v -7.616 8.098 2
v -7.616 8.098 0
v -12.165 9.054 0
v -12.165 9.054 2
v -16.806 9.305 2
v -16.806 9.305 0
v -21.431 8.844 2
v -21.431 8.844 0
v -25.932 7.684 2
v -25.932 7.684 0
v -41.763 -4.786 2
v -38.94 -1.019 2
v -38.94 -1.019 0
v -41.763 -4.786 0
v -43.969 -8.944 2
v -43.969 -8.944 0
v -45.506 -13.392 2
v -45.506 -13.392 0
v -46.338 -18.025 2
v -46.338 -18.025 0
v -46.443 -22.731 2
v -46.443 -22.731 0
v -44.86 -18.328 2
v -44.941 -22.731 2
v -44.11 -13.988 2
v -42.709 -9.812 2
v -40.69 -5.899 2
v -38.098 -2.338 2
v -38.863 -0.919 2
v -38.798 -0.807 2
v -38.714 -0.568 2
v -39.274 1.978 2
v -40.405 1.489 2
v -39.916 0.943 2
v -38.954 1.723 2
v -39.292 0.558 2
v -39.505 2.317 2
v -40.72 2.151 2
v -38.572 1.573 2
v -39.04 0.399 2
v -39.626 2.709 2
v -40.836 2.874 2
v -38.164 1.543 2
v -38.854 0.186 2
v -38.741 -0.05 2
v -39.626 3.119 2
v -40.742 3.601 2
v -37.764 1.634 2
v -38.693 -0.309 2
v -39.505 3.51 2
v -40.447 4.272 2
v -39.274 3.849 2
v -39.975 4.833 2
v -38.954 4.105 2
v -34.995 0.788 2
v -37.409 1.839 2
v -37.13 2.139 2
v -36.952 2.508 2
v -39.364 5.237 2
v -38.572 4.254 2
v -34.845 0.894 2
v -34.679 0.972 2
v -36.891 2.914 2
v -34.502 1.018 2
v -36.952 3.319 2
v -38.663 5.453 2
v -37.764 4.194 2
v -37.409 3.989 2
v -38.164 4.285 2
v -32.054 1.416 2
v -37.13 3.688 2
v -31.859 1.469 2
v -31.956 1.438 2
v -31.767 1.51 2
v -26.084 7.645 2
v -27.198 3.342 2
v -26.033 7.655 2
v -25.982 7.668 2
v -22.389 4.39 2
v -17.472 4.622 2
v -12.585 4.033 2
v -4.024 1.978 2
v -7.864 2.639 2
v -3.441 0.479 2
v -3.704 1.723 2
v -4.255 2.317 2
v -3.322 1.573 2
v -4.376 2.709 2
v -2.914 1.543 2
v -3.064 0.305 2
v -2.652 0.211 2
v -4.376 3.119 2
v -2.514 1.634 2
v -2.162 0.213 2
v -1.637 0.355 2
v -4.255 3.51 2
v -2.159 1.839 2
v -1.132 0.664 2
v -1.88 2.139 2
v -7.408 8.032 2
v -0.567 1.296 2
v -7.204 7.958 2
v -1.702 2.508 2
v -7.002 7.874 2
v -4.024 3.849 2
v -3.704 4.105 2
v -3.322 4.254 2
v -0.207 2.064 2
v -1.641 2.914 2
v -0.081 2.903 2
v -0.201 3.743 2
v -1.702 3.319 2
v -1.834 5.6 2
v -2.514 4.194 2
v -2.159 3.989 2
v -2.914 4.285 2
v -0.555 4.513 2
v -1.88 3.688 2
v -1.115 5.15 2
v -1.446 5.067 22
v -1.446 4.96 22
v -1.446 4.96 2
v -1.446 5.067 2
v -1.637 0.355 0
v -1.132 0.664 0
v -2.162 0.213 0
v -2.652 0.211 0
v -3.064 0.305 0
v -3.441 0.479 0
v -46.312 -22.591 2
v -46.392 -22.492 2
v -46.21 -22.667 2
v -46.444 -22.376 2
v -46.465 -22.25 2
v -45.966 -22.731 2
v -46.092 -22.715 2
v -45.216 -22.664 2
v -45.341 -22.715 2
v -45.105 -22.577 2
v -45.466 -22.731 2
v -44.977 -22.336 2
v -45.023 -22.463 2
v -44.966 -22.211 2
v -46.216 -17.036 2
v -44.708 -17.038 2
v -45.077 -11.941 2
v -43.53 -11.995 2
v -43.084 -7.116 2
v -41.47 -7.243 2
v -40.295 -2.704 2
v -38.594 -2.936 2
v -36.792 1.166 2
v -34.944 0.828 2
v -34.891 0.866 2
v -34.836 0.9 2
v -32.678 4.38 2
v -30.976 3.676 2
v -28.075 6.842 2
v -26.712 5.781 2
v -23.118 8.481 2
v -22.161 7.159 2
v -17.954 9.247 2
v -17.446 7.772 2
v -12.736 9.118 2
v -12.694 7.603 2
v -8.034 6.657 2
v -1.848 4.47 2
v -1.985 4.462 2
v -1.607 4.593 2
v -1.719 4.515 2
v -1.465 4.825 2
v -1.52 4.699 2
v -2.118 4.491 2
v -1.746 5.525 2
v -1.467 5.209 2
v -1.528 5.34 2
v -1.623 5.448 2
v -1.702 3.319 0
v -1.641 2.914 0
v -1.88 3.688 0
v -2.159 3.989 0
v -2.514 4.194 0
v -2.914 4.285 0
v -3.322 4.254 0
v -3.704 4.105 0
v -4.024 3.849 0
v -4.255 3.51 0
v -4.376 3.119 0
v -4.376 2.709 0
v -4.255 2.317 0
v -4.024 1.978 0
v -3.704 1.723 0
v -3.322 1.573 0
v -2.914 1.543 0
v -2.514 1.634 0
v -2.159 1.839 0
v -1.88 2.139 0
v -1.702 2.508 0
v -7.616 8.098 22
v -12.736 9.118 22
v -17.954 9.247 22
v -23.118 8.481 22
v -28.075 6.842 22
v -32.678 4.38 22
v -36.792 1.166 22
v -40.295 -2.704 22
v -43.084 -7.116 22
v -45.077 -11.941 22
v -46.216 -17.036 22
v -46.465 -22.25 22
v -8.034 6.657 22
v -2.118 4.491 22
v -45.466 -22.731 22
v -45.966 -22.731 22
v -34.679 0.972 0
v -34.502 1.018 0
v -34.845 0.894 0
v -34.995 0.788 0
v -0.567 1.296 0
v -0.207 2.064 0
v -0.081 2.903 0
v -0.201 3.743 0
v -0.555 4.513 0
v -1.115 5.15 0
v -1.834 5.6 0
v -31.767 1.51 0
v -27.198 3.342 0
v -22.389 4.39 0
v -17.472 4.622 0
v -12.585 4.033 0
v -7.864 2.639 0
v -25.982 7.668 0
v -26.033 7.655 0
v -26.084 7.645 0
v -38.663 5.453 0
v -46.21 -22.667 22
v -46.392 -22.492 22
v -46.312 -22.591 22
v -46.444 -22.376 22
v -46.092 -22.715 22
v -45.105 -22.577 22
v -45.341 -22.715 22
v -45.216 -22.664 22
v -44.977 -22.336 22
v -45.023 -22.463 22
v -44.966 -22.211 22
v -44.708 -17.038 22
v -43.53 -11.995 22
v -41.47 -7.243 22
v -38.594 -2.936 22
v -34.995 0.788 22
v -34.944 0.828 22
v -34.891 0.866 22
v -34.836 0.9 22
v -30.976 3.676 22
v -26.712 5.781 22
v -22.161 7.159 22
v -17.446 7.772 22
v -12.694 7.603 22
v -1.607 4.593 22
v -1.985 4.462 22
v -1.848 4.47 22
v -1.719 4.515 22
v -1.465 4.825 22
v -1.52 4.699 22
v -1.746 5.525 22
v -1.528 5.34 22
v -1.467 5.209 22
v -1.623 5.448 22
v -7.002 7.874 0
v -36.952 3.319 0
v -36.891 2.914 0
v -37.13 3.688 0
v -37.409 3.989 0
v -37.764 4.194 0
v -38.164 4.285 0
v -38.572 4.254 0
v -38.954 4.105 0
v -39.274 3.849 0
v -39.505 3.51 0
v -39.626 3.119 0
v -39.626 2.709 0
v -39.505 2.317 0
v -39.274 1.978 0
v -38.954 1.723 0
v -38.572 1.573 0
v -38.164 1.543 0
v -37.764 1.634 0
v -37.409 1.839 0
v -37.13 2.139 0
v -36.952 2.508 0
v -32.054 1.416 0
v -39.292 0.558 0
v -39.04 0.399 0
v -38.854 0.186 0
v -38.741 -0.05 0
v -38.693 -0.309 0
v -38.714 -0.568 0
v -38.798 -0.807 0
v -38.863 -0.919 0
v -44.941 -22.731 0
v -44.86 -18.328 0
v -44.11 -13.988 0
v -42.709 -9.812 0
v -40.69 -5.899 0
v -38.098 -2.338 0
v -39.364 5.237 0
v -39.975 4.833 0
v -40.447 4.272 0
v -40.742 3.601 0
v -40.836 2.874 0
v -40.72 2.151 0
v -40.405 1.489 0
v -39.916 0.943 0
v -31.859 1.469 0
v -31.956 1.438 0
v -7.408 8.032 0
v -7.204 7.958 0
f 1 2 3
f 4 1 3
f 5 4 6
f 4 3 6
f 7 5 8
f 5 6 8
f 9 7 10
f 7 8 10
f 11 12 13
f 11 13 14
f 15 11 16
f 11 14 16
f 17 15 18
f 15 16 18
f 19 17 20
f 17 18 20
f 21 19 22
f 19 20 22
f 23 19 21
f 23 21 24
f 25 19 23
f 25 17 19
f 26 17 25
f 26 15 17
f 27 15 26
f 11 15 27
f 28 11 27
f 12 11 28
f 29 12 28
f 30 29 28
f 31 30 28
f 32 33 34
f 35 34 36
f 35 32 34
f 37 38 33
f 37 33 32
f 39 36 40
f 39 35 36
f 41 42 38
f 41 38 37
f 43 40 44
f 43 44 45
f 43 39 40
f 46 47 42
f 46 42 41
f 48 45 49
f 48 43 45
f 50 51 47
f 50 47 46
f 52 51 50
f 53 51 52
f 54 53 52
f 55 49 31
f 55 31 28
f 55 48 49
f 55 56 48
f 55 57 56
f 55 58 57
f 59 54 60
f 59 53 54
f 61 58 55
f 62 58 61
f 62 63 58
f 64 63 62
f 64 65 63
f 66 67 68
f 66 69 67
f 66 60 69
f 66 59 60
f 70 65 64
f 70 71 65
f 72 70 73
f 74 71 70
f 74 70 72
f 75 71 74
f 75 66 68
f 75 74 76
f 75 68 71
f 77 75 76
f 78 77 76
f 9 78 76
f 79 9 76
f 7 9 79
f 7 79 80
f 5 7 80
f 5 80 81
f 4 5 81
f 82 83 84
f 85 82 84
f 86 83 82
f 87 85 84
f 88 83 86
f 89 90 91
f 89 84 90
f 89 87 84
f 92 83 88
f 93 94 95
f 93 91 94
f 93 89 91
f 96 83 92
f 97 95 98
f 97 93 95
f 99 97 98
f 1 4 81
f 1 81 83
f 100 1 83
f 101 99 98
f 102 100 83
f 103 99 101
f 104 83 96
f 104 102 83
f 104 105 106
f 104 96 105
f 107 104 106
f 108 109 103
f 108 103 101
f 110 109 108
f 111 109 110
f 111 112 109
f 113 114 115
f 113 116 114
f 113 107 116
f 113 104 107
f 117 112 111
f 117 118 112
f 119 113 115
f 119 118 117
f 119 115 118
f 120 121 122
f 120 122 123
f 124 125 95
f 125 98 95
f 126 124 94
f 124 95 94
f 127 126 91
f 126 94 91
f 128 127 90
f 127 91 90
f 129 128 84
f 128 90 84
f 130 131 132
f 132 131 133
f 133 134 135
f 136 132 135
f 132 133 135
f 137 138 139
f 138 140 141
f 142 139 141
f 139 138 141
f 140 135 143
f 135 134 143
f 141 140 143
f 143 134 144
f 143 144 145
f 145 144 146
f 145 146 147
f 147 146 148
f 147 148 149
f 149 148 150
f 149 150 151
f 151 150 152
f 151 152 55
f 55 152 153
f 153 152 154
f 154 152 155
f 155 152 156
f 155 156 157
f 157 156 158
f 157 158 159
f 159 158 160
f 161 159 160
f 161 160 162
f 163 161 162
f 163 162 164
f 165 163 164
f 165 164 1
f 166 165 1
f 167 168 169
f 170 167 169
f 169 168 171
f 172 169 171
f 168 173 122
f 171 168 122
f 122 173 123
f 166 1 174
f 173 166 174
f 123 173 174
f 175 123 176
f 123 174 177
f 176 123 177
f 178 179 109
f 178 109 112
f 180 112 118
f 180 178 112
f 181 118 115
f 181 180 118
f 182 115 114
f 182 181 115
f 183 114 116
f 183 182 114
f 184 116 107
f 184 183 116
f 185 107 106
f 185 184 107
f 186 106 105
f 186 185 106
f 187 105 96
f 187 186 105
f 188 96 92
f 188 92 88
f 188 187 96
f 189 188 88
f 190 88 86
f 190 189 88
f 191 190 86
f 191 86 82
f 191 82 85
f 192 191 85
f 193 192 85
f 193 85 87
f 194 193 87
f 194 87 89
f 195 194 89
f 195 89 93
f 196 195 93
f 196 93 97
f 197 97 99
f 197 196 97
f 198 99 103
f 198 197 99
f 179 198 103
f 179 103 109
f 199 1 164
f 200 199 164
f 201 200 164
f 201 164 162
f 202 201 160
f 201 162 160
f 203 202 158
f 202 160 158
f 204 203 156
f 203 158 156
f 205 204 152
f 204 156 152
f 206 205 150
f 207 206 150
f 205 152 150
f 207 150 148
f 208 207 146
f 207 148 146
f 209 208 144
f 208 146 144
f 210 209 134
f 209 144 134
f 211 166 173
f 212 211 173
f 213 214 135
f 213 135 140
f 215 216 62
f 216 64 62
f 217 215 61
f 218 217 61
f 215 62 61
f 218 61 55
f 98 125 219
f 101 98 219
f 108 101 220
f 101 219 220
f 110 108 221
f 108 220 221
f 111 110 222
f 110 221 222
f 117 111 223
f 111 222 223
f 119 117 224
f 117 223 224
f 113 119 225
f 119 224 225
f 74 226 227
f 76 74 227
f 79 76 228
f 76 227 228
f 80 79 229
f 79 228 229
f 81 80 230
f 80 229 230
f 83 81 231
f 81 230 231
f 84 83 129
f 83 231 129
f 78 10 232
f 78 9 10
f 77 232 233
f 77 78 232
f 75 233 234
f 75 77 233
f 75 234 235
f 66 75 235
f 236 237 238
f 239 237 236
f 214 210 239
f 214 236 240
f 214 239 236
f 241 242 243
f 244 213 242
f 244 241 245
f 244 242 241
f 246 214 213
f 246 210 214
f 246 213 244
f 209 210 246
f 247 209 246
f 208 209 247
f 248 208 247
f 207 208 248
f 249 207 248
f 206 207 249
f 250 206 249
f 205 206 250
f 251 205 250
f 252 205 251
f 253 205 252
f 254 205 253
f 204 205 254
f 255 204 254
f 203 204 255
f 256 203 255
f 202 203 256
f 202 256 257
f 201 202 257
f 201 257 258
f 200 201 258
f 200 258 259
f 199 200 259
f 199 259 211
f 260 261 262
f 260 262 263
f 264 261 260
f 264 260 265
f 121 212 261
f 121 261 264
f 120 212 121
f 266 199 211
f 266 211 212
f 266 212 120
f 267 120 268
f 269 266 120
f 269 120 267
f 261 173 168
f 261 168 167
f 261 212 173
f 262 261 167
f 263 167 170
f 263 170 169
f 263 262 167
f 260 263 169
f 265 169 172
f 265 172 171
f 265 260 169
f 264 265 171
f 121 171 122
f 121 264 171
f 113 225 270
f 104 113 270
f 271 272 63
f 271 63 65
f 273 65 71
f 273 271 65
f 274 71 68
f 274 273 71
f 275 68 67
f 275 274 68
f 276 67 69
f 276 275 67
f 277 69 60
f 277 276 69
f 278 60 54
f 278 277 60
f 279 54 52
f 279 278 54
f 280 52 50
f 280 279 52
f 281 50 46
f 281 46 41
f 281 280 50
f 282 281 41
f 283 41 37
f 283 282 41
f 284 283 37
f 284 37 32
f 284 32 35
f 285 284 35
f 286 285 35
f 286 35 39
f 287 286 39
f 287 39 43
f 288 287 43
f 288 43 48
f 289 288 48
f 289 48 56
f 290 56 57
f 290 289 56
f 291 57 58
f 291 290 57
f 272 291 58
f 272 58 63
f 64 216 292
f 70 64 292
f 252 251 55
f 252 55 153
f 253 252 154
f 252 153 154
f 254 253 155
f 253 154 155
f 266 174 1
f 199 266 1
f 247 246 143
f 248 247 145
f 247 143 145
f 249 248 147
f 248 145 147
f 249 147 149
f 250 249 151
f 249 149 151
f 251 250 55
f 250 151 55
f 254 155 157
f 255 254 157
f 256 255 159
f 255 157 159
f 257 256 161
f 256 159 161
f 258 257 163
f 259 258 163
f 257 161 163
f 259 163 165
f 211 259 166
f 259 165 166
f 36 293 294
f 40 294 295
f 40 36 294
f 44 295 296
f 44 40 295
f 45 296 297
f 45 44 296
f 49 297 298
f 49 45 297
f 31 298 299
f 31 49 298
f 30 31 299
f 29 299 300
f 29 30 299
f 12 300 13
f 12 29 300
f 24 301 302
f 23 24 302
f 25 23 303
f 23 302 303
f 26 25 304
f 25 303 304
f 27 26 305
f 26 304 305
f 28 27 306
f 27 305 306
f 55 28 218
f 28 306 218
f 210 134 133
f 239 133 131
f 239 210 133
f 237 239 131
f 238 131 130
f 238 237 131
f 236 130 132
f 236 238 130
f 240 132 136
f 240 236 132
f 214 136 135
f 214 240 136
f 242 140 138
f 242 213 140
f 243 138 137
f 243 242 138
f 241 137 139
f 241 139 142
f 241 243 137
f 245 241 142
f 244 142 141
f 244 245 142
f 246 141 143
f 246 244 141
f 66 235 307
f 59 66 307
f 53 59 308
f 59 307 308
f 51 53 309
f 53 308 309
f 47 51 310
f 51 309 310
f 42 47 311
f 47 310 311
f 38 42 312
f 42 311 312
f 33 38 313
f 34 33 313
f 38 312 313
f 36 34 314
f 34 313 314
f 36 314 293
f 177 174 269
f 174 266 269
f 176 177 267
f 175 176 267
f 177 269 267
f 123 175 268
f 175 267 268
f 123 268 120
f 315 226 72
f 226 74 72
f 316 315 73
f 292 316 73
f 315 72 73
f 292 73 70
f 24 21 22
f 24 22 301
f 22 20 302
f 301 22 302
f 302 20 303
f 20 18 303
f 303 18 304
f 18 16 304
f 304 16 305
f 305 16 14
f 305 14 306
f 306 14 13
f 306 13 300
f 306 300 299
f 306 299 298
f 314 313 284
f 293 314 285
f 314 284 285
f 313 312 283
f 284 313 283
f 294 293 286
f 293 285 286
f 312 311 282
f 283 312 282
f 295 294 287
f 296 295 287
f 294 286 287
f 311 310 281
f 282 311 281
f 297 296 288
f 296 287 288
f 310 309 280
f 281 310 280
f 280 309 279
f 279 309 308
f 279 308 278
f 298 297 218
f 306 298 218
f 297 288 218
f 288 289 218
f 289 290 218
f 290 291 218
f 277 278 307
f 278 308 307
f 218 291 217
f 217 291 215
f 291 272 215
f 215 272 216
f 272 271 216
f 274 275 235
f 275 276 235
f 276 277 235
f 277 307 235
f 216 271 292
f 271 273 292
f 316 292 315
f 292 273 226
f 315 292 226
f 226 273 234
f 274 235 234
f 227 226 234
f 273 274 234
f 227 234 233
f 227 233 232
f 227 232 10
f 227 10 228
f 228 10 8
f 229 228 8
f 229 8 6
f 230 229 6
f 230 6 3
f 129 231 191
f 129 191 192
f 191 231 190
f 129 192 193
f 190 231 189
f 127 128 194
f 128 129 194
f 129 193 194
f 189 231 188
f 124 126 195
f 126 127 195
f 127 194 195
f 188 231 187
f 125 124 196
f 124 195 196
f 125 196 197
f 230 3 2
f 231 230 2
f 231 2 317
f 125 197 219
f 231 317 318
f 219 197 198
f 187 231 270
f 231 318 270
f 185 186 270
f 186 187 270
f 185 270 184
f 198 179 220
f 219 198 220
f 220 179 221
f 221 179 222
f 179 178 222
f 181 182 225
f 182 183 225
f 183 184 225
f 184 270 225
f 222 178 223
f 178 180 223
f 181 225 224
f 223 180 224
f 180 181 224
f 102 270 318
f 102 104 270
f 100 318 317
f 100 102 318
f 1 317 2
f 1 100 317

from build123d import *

# Parameters (mm, degrees)
F0_R     = 1.375
F1_DEPTH = 2
F2_R     = 2
F3_R     = 1
F4_R     = 5
F6_DEPTH = 20
F7_R     = 0.5


with BuildPart() as f1:
    # F0 (on Top) → F1 (new body)
    with BuildSketch(Plane.XY):
        with BuildLine():
            Line((-26.0058527609, 7.6584140292), (-38.6634979914, 5.4525812352))
            ThreePointArc((-38.6634979914, 5.4525812352), (-40.7772058577, 2.3672063948), (-37.5723509725, 0.439460557))
            ThreePointArc((-37.5723509725, 0.439460557), (-32.1994597429, 4.7064292217), (-26.0058527609, 7.6584140292))
        make_face()
        with Locations((-38.2662601769, 2.91373441)):
            Circle(F0_R, mode=Mode.SUBTRACT)
        with BuildLine():
            ThreePointArc((-26.0058527609, 7.6584140292), (-32.1994597429, 4.7064292217), (-37.5723509725, 0.439460557))
            ThreePointArc((-37.5723509725, 0.439460557), (-44.4817901409, -10.1985694874), (-46.4430912529, -22.7309806996))
            Line((-46.4430912529, -22.7309806996), (-44.9406874418, -22.7309806996))
            ThreePointArc((-44.9406874418, -22.7309806996), (-42.6535203698, -9.6810899108), (-34.7781050217, 0.9729523227))
            ThreePointArc((-34.7781050217, 0.9729523227), (-21.9636028513, 7.2148890549), (-7.724548842, 6.5648267778))
            Line((-7.724548842, 6.5648267778), (-1.8342146029, 4.774504763))
            Line((-1.8342146029, 4.774504763), (-1.8342146029, 5.6000485559))
            Line((-1.8342146029, 5.6000485559), (-7.2883389242, 8))
            ThreePointArc((-7.2883389242, 8), (-16.6740730858, 9.3074495856), (-26.0058527609, 7.6584140292))
        make_face()
        with BuildLine():
            ThreePointArc((-2.664596676, 0), (-0.1131236251, 2.4832537589), (-1.8342146029, 5.6000485559))
            Line((-1.8342146029, 5.6000485559), (-1.8342146029, 4.774504763))
            Line((-1.8342146029, 4.774504763), (-7.724548842, 6.5648267778))
            ThreePointArc((-7.724548842, 6.5648267778), (-21.9636028513, 7.2148890549), (-34.7781050217, 0.9729523227))
            Line((-34.7781050217, 0.9729523227), (-31.902086389, 1.441097722))
            ThreePointArc((-31.902086389, 1.441097722), (-17.0918371374, 4.6058563567), (-2.664596676, 0))
        make_face()
        with Locations((-3.0162601769, 2.91373441)):
            Circle(F0_R, mode=Mode.SUBTRACT)
    extrude(amount=F1_DEPTH)

    # F2
    f2_edges = [f1.edges().sort_by_distance(p)[0] for p in [
        (-2.664597, 0, 1),
    ]]
    fillet(f2_edges, radius=F2_R)

    # F3
    f3_edges = [f1.edges().sort_by_distance(p)[0] for p in [
        (-26.005853, 7.658414, 1),
        (-31.902086, 1.441098, 1),
        (-34.778105, 0.972952, 1),
        (-37.572351, 0.439461, 1),
    ]]
    fillet(f3_edges, radius=F3_R)

    # F4
    f4_edges = [f1.edges().sort_by_distance(p)[0] for p in [
        (-7.288339, 8, 1),
        (-26.083712, 7.644846, 1),
    ]]
    fillet(f4_edges, radius=F4_R)


with BuildPart() as f6:
    # F5 (on face) → F6 (new body)
    with BuildSketch(Plane.XY.offset(2)):
        with BuildLine():
            Line((-1.4463049592, 5.3934029451), (-7.6160189779, 8.0975843223))
            ThreePointArc((-7.6160189779, 8.0975843223), (-34.9929371242, 2.7127925965), (-46.4430912529, -22.7309806996))
            Line((-46.4430912529, -22.7309806996), (-44.9406874418, -22.7309806996))
            ThreePointArc((-44.9406874418, -22.7309806996), (-44.9430098061, -22.6905101609), (-44.9452753412, -22.6500364012))
            ThreePointArc((-44.9452753412, -22.6500364012), (-42.6935542226, -9.7749251828), (-34.9947559807, 0.7876144034))
            ThreePointArc((-34.9947559807, 0.7876144034), (-34.9180457047, 0.8476280114), (-34.8358610826, 0.8998945155))
            ThreePointArc((-34.8358610826, 0.8998945155), (-22.1613171571, 7.1591912589), (-8.0343653338, 6.6571039895))
            Line((-8.0343653338, 6.6571039895), (-1.4463049592, 4.2445384897))
            Line((-1.4463049592, 4.2445384897), (-1.4463049592, 5.3934029451))
        make_face()
    extrude(amount=F6_DEPTH)

    # F7
    f7_edges = [f6.edges().sort_by_distance(p)[0] for p in [
        (-1.446305, 4.244538, 12),
        (-1.446305, 5.393403, 12),
        (-44.940687, -22.730981, 12),
        (-46.443091, -22.730981, 12),
    ]]
    fillet(f7_edges, radius=F7_R)


solid = Compound([f1.part, f6.part])
